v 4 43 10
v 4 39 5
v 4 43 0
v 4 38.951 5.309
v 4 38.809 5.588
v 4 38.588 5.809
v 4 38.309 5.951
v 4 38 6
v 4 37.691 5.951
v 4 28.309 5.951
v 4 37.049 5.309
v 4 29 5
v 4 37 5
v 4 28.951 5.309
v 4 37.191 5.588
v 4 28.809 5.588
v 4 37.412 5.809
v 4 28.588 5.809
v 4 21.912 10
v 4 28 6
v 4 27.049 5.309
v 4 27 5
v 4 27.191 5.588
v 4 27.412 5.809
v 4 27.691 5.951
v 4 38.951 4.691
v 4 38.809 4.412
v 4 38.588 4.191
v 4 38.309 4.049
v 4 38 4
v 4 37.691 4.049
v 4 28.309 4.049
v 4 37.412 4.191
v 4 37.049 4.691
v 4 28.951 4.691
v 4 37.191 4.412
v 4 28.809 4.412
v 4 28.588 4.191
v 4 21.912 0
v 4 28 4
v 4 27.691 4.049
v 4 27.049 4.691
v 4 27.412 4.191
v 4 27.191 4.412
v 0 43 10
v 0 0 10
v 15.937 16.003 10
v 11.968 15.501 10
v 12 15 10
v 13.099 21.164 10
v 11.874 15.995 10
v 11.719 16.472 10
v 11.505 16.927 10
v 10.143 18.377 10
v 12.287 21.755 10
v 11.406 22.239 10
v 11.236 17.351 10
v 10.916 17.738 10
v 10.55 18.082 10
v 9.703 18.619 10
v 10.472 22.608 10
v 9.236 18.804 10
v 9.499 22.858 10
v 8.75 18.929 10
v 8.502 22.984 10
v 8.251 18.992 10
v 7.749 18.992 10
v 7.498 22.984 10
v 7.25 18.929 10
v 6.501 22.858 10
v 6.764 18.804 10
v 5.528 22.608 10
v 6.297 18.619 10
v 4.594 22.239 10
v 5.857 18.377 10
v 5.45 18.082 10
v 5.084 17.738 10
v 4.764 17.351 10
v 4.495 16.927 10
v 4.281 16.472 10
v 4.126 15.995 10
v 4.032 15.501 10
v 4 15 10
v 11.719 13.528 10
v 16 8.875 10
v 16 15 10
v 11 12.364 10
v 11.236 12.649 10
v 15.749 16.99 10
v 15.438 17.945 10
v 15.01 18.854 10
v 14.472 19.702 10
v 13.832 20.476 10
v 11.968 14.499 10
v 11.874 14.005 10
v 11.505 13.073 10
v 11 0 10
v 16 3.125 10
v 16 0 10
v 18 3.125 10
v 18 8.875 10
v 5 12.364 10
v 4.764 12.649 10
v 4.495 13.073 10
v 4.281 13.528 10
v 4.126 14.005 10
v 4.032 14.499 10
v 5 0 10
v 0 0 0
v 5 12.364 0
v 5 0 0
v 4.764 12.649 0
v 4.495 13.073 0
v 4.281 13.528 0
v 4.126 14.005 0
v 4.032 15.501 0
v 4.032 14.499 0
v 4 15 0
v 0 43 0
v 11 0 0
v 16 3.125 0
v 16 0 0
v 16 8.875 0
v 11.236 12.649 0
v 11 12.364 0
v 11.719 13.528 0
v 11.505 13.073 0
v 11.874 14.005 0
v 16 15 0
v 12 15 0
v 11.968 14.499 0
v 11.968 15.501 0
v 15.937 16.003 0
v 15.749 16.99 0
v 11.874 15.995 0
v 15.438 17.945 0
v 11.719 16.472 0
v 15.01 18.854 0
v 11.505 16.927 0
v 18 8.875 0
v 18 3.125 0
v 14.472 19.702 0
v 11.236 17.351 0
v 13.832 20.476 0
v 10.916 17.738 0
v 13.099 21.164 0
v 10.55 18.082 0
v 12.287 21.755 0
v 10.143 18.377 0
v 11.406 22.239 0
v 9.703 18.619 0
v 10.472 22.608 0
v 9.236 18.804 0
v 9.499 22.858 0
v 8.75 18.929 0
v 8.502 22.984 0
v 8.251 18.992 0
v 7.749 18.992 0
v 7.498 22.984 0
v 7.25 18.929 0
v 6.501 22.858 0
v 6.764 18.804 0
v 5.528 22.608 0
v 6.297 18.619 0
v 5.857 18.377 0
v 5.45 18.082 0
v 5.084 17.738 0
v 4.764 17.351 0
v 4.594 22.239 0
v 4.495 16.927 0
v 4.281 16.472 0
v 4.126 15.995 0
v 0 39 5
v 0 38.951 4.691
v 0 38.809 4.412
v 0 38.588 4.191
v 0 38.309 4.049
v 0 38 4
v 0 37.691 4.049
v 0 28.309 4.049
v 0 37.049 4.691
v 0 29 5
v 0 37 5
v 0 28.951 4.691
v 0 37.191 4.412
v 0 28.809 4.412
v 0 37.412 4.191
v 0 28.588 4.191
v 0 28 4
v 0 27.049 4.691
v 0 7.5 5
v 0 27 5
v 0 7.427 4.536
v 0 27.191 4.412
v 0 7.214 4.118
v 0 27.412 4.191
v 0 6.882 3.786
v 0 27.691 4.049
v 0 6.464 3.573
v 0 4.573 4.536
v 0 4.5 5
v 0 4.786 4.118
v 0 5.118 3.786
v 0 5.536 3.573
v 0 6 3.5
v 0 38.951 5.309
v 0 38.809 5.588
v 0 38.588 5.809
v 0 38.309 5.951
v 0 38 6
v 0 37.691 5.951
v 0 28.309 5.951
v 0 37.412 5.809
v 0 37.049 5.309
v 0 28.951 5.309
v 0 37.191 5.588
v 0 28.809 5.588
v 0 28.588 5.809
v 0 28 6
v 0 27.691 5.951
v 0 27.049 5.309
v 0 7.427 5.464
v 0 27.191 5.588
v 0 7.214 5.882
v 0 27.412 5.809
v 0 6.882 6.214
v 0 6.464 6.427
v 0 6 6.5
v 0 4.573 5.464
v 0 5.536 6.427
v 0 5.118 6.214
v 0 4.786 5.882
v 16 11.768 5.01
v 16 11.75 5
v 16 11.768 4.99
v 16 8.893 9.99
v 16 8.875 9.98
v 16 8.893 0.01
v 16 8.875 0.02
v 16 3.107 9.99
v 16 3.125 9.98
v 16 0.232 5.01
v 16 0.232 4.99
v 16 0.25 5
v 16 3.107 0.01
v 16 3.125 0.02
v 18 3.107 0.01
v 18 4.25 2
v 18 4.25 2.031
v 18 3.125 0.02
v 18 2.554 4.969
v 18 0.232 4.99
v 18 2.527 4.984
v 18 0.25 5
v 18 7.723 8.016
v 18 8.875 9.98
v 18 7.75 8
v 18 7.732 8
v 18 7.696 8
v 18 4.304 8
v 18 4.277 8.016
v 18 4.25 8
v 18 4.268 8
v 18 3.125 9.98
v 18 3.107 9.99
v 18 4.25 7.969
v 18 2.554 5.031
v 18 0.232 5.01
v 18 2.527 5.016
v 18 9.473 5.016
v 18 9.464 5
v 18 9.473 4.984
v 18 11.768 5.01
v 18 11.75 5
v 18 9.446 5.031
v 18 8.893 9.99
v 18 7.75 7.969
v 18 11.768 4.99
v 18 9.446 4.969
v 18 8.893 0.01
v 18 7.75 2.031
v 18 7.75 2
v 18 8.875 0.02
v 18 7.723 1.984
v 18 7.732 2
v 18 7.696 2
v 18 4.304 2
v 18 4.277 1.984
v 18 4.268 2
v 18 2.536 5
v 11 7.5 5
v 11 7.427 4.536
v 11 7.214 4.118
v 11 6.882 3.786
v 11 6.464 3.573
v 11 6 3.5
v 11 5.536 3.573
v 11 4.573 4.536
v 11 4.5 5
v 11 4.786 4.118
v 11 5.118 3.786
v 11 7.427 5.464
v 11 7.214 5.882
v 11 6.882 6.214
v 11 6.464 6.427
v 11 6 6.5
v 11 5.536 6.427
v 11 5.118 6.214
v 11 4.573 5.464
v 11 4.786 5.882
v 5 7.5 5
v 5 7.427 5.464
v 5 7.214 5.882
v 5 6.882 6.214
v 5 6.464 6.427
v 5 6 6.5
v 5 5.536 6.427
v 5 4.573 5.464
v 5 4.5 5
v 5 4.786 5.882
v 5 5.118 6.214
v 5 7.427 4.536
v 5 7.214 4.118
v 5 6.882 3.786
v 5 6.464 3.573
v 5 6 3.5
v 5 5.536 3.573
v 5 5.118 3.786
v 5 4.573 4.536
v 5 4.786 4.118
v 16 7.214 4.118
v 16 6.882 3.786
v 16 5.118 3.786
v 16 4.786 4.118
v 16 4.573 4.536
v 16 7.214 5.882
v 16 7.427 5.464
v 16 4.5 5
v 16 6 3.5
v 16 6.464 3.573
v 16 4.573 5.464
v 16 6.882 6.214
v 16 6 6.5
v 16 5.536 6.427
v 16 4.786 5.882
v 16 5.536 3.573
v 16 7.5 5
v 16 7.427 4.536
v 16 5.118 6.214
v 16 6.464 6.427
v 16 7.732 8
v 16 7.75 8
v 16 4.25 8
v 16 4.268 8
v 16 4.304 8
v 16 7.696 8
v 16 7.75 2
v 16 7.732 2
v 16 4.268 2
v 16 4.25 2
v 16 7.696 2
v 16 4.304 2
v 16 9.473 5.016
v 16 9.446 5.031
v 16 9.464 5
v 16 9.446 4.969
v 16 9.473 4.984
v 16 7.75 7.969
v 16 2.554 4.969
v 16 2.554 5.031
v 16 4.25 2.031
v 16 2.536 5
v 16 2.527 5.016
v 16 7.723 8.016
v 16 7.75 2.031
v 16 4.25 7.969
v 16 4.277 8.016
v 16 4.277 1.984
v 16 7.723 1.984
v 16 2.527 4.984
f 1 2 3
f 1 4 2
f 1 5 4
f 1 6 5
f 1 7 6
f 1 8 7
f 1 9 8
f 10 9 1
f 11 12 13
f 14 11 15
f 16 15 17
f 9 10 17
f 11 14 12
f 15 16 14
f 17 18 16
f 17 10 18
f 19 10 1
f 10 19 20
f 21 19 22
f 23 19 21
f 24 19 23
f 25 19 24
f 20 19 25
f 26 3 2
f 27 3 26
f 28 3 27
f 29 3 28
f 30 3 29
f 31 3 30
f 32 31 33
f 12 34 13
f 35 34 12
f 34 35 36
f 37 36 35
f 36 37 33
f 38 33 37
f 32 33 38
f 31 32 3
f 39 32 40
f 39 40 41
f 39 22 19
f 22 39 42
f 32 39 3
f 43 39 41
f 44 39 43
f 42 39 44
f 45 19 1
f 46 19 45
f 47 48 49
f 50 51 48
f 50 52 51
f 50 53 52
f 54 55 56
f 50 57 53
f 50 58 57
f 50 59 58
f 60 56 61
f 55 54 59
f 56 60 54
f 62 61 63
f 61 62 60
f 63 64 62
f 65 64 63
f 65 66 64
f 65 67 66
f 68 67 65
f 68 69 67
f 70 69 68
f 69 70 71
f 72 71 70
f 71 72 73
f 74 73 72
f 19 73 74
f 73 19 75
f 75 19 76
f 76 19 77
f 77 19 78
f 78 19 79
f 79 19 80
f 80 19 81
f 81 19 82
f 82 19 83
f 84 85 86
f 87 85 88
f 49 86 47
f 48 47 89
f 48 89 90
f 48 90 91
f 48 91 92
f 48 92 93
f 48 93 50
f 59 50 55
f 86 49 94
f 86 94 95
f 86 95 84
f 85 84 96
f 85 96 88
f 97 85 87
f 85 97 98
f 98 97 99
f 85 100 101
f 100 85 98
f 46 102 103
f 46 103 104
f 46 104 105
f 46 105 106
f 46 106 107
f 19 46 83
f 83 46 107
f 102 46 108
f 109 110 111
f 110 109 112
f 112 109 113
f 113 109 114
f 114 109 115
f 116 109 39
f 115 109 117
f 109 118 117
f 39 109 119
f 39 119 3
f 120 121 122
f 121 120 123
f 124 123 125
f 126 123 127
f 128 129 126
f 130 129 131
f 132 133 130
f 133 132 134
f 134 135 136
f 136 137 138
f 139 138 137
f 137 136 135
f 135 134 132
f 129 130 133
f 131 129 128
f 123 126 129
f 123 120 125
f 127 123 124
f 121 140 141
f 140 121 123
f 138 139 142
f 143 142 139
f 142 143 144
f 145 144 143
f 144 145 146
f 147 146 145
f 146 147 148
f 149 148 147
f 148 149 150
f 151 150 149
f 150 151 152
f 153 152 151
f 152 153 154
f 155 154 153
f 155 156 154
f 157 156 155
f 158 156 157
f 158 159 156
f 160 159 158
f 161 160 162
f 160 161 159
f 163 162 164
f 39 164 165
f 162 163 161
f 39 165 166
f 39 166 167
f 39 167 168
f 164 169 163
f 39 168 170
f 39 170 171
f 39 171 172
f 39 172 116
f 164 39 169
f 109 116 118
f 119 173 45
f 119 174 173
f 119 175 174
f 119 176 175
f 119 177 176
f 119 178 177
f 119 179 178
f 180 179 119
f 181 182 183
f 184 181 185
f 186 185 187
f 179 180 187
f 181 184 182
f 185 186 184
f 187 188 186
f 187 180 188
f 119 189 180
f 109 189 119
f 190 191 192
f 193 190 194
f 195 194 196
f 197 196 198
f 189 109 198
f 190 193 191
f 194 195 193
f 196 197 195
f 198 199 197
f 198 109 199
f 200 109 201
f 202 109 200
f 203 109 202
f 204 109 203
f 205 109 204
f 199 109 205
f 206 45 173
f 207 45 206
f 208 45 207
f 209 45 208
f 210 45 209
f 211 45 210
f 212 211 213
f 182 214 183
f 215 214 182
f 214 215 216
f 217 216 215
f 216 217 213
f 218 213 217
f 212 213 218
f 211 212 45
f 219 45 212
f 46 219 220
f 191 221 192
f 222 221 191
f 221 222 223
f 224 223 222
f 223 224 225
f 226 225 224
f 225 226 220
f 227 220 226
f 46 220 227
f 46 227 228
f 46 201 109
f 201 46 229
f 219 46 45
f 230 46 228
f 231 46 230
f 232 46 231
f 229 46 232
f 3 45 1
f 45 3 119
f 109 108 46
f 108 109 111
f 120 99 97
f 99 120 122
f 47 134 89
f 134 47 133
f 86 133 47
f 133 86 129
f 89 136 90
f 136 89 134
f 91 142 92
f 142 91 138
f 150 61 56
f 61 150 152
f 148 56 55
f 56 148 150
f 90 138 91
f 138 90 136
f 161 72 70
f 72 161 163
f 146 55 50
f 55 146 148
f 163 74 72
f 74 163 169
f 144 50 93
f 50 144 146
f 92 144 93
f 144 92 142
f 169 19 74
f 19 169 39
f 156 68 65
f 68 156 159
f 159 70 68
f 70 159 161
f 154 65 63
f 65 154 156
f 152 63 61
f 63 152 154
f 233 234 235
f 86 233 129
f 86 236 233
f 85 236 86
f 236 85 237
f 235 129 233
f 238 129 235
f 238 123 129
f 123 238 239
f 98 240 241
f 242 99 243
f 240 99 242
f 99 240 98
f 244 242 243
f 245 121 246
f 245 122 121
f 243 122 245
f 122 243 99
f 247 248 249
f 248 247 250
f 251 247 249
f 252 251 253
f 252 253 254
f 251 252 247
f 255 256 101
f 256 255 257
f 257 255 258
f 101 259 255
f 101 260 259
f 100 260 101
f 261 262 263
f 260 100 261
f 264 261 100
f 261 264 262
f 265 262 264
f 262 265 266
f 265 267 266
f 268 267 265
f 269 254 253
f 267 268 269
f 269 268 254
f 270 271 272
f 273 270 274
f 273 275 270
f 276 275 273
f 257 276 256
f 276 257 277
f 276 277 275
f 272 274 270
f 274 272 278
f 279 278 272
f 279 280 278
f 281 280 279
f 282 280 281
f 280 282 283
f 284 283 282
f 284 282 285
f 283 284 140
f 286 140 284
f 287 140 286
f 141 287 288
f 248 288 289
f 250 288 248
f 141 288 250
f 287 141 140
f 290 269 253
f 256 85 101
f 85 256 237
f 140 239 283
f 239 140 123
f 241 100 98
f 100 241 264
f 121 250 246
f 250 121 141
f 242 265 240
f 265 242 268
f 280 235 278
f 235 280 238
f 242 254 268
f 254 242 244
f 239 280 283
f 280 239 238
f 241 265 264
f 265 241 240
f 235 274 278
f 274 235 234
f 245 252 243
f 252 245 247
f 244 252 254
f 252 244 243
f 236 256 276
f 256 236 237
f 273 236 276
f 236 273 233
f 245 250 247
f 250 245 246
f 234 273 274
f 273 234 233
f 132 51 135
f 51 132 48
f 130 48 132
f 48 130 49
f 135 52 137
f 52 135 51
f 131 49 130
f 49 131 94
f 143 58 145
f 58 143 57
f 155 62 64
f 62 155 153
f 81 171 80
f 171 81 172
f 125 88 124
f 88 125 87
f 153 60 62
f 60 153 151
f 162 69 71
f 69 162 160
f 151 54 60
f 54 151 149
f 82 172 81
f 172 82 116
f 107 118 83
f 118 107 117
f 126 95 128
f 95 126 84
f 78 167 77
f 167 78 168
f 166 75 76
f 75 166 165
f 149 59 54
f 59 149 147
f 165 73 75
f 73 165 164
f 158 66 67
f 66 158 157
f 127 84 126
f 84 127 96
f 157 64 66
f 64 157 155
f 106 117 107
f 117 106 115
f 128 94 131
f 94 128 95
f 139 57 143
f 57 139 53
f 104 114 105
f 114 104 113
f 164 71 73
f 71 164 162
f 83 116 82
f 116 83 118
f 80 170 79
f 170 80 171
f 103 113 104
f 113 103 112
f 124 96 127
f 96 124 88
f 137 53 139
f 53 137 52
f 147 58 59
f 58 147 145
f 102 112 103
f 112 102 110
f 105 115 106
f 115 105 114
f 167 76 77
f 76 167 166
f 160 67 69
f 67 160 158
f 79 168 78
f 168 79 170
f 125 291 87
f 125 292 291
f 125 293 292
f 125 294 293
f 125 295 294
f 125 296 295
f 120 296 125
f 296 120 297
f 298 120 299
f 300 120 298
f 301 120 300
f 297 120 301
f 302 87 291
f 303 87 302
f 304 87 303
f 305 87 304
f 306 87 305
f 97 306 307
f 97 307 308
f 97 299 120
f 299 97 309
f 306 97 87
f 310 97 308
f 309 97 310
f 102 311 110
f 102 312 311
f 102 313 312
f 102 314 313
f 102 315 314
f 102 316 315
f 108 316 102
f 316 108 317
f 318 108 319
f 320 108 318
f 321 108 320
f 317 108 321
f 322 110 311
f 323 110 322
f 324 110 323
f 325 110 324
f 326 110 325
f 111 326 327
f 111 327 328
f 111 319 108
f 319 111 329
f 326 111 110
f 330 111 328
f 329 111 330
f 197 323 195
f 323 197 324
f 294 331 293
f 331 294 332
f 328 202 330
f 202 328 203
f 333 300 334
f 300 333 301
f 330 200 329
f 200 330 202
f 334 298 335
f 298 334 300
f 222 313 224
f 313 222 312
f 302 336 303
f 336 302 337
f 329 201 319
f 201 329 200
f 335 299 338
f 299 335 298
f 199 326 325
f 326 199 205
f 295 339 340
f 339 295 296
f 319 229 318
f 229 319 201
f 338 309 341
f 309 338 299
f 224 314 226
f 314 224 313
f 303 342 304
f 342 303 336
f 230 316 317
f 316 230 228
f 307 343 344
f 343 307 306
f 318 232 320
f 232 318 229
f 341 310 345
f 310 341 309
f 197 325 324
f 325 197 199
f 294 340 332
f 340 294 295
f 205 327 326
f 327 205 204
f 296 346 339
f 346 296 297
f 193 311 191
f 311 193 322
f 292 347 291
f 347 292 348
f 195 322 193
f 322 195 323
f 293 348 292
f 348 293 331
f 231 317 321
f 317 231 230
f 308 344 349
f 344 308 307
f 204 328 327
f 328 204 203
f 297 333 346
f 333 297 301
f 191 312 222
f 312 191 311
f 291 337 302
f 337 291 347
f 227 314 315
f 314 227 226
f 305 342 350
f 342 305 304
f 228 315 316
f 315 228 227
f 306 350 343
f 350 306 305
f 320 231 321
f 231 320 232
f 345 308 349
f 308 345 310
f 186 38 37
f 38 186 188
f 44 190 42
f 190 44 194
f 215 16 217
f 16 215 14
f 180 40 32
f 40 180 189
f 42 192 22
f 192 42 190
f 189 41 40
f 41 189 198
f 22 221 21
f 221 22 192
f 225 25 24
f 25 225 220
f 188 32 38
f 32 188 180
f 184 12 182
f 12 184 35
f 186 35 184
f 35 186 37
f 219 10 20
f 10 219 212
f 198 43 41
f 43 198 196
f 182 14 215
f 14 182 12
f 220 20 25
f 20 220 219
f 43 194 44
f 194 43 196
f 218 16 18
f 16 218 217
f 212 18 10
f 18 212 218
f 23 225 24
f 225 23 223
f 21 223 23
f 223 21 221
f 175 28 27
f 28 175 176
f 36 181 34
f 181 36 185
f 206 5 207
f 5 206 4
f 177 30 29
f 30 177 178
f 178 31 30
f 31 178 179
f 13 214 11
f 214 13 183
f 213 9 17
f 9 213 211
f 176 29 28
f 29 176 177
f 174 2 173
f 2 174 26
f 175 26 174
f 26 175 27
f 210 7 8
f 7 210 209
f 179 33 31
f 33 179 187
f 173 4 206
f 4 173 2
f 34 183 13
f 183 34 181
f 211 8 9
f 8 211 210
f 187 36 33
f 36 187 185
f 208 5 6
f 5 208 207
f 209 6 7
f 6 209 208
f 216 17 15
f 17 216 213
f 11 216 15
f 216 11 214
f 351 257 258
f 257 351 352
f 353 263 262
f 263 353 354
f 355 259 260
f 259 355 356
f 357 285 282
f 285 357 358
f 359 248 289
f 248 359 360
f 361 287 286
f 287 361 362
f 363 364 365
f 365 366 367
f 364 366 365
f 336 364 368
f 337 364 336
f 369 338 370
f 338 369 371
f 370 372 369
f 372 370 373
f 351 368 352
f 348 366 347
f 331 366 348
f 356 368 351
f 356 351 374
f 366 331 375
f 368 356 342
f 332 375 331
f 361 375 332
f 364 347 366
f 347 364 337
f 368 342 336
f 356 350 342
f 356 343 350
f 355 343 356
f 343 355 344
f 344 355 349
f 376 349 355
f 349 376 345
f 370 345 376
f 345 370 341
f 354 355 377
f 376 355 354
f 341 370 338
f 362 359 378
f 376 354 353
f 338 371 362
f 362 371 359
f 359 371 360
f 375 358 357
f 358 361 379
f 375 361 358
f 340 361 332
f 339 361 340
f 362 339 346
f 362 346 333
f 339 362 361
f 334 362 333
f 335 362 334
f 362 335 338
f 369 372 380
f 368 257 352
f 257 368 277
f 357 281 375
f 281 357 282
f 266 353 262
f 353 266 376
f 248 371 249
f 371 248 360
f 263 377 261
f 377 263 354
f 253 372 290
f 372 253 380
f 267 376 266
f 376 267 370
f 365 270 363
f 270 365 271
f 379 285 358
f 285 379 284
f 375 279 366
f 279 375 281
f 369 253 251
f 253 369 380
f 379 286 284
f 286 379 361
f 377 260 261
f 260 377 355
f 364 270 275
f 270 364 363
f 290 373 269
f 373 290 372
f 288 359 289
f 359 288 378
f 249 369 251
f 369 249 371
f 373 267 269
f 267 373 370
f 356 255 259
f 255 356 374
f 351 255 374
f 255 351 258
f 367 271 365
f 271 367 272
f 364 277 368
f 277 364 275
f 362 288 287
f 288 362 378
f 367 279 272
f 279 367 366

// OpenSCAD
difference() {
	union() {
		cube([4,43,10]);  //4,45,10
		translate([8, 15,0]) cylinder(h = 10, r = 8, $fn = 50);
		cube([16, 15,10]);
		
		translate([17,6,5]) cube([2,5.75,10], center=true);
		translate([17,6,5]) rotate(a=[60,0,0]) cube([2,5.75,10], center=true);
		translate([17,6,5]) rotate(a=[120,0,0]) cube([2,5.75,10], center=true);
	}
	translate([8, 15,0]) cylinder(h = 10, r = 4, $fn = 50);
	translate([5, 0, 0]) cube([6, 15,10]);
	translate([-10, 6, 5]) rotate(a=[0, 90, 0]) cylinder(h = 30, r = 1.5, $fn= 20);
	translate([-10, 28, 5]) rotate(a=[0, 90, 0]) cylinder(h = 30, r = 1, $fn= 20);
	translate([-10, 38, 5]) rotate(a=[0, 90, 0]) cylinder(h = 30, r = 1, $fn= 20);
	translate([17,6,5]) cube([2,3.5,6], center=true);
	translate([17,6,5]) rotate(a=[60,0,0]) cube([2,3.5,6], center=true);
	translate([17,6,5]) rotate(a=[120,0,0]) cube([2,3.5,6], center=true);
}
